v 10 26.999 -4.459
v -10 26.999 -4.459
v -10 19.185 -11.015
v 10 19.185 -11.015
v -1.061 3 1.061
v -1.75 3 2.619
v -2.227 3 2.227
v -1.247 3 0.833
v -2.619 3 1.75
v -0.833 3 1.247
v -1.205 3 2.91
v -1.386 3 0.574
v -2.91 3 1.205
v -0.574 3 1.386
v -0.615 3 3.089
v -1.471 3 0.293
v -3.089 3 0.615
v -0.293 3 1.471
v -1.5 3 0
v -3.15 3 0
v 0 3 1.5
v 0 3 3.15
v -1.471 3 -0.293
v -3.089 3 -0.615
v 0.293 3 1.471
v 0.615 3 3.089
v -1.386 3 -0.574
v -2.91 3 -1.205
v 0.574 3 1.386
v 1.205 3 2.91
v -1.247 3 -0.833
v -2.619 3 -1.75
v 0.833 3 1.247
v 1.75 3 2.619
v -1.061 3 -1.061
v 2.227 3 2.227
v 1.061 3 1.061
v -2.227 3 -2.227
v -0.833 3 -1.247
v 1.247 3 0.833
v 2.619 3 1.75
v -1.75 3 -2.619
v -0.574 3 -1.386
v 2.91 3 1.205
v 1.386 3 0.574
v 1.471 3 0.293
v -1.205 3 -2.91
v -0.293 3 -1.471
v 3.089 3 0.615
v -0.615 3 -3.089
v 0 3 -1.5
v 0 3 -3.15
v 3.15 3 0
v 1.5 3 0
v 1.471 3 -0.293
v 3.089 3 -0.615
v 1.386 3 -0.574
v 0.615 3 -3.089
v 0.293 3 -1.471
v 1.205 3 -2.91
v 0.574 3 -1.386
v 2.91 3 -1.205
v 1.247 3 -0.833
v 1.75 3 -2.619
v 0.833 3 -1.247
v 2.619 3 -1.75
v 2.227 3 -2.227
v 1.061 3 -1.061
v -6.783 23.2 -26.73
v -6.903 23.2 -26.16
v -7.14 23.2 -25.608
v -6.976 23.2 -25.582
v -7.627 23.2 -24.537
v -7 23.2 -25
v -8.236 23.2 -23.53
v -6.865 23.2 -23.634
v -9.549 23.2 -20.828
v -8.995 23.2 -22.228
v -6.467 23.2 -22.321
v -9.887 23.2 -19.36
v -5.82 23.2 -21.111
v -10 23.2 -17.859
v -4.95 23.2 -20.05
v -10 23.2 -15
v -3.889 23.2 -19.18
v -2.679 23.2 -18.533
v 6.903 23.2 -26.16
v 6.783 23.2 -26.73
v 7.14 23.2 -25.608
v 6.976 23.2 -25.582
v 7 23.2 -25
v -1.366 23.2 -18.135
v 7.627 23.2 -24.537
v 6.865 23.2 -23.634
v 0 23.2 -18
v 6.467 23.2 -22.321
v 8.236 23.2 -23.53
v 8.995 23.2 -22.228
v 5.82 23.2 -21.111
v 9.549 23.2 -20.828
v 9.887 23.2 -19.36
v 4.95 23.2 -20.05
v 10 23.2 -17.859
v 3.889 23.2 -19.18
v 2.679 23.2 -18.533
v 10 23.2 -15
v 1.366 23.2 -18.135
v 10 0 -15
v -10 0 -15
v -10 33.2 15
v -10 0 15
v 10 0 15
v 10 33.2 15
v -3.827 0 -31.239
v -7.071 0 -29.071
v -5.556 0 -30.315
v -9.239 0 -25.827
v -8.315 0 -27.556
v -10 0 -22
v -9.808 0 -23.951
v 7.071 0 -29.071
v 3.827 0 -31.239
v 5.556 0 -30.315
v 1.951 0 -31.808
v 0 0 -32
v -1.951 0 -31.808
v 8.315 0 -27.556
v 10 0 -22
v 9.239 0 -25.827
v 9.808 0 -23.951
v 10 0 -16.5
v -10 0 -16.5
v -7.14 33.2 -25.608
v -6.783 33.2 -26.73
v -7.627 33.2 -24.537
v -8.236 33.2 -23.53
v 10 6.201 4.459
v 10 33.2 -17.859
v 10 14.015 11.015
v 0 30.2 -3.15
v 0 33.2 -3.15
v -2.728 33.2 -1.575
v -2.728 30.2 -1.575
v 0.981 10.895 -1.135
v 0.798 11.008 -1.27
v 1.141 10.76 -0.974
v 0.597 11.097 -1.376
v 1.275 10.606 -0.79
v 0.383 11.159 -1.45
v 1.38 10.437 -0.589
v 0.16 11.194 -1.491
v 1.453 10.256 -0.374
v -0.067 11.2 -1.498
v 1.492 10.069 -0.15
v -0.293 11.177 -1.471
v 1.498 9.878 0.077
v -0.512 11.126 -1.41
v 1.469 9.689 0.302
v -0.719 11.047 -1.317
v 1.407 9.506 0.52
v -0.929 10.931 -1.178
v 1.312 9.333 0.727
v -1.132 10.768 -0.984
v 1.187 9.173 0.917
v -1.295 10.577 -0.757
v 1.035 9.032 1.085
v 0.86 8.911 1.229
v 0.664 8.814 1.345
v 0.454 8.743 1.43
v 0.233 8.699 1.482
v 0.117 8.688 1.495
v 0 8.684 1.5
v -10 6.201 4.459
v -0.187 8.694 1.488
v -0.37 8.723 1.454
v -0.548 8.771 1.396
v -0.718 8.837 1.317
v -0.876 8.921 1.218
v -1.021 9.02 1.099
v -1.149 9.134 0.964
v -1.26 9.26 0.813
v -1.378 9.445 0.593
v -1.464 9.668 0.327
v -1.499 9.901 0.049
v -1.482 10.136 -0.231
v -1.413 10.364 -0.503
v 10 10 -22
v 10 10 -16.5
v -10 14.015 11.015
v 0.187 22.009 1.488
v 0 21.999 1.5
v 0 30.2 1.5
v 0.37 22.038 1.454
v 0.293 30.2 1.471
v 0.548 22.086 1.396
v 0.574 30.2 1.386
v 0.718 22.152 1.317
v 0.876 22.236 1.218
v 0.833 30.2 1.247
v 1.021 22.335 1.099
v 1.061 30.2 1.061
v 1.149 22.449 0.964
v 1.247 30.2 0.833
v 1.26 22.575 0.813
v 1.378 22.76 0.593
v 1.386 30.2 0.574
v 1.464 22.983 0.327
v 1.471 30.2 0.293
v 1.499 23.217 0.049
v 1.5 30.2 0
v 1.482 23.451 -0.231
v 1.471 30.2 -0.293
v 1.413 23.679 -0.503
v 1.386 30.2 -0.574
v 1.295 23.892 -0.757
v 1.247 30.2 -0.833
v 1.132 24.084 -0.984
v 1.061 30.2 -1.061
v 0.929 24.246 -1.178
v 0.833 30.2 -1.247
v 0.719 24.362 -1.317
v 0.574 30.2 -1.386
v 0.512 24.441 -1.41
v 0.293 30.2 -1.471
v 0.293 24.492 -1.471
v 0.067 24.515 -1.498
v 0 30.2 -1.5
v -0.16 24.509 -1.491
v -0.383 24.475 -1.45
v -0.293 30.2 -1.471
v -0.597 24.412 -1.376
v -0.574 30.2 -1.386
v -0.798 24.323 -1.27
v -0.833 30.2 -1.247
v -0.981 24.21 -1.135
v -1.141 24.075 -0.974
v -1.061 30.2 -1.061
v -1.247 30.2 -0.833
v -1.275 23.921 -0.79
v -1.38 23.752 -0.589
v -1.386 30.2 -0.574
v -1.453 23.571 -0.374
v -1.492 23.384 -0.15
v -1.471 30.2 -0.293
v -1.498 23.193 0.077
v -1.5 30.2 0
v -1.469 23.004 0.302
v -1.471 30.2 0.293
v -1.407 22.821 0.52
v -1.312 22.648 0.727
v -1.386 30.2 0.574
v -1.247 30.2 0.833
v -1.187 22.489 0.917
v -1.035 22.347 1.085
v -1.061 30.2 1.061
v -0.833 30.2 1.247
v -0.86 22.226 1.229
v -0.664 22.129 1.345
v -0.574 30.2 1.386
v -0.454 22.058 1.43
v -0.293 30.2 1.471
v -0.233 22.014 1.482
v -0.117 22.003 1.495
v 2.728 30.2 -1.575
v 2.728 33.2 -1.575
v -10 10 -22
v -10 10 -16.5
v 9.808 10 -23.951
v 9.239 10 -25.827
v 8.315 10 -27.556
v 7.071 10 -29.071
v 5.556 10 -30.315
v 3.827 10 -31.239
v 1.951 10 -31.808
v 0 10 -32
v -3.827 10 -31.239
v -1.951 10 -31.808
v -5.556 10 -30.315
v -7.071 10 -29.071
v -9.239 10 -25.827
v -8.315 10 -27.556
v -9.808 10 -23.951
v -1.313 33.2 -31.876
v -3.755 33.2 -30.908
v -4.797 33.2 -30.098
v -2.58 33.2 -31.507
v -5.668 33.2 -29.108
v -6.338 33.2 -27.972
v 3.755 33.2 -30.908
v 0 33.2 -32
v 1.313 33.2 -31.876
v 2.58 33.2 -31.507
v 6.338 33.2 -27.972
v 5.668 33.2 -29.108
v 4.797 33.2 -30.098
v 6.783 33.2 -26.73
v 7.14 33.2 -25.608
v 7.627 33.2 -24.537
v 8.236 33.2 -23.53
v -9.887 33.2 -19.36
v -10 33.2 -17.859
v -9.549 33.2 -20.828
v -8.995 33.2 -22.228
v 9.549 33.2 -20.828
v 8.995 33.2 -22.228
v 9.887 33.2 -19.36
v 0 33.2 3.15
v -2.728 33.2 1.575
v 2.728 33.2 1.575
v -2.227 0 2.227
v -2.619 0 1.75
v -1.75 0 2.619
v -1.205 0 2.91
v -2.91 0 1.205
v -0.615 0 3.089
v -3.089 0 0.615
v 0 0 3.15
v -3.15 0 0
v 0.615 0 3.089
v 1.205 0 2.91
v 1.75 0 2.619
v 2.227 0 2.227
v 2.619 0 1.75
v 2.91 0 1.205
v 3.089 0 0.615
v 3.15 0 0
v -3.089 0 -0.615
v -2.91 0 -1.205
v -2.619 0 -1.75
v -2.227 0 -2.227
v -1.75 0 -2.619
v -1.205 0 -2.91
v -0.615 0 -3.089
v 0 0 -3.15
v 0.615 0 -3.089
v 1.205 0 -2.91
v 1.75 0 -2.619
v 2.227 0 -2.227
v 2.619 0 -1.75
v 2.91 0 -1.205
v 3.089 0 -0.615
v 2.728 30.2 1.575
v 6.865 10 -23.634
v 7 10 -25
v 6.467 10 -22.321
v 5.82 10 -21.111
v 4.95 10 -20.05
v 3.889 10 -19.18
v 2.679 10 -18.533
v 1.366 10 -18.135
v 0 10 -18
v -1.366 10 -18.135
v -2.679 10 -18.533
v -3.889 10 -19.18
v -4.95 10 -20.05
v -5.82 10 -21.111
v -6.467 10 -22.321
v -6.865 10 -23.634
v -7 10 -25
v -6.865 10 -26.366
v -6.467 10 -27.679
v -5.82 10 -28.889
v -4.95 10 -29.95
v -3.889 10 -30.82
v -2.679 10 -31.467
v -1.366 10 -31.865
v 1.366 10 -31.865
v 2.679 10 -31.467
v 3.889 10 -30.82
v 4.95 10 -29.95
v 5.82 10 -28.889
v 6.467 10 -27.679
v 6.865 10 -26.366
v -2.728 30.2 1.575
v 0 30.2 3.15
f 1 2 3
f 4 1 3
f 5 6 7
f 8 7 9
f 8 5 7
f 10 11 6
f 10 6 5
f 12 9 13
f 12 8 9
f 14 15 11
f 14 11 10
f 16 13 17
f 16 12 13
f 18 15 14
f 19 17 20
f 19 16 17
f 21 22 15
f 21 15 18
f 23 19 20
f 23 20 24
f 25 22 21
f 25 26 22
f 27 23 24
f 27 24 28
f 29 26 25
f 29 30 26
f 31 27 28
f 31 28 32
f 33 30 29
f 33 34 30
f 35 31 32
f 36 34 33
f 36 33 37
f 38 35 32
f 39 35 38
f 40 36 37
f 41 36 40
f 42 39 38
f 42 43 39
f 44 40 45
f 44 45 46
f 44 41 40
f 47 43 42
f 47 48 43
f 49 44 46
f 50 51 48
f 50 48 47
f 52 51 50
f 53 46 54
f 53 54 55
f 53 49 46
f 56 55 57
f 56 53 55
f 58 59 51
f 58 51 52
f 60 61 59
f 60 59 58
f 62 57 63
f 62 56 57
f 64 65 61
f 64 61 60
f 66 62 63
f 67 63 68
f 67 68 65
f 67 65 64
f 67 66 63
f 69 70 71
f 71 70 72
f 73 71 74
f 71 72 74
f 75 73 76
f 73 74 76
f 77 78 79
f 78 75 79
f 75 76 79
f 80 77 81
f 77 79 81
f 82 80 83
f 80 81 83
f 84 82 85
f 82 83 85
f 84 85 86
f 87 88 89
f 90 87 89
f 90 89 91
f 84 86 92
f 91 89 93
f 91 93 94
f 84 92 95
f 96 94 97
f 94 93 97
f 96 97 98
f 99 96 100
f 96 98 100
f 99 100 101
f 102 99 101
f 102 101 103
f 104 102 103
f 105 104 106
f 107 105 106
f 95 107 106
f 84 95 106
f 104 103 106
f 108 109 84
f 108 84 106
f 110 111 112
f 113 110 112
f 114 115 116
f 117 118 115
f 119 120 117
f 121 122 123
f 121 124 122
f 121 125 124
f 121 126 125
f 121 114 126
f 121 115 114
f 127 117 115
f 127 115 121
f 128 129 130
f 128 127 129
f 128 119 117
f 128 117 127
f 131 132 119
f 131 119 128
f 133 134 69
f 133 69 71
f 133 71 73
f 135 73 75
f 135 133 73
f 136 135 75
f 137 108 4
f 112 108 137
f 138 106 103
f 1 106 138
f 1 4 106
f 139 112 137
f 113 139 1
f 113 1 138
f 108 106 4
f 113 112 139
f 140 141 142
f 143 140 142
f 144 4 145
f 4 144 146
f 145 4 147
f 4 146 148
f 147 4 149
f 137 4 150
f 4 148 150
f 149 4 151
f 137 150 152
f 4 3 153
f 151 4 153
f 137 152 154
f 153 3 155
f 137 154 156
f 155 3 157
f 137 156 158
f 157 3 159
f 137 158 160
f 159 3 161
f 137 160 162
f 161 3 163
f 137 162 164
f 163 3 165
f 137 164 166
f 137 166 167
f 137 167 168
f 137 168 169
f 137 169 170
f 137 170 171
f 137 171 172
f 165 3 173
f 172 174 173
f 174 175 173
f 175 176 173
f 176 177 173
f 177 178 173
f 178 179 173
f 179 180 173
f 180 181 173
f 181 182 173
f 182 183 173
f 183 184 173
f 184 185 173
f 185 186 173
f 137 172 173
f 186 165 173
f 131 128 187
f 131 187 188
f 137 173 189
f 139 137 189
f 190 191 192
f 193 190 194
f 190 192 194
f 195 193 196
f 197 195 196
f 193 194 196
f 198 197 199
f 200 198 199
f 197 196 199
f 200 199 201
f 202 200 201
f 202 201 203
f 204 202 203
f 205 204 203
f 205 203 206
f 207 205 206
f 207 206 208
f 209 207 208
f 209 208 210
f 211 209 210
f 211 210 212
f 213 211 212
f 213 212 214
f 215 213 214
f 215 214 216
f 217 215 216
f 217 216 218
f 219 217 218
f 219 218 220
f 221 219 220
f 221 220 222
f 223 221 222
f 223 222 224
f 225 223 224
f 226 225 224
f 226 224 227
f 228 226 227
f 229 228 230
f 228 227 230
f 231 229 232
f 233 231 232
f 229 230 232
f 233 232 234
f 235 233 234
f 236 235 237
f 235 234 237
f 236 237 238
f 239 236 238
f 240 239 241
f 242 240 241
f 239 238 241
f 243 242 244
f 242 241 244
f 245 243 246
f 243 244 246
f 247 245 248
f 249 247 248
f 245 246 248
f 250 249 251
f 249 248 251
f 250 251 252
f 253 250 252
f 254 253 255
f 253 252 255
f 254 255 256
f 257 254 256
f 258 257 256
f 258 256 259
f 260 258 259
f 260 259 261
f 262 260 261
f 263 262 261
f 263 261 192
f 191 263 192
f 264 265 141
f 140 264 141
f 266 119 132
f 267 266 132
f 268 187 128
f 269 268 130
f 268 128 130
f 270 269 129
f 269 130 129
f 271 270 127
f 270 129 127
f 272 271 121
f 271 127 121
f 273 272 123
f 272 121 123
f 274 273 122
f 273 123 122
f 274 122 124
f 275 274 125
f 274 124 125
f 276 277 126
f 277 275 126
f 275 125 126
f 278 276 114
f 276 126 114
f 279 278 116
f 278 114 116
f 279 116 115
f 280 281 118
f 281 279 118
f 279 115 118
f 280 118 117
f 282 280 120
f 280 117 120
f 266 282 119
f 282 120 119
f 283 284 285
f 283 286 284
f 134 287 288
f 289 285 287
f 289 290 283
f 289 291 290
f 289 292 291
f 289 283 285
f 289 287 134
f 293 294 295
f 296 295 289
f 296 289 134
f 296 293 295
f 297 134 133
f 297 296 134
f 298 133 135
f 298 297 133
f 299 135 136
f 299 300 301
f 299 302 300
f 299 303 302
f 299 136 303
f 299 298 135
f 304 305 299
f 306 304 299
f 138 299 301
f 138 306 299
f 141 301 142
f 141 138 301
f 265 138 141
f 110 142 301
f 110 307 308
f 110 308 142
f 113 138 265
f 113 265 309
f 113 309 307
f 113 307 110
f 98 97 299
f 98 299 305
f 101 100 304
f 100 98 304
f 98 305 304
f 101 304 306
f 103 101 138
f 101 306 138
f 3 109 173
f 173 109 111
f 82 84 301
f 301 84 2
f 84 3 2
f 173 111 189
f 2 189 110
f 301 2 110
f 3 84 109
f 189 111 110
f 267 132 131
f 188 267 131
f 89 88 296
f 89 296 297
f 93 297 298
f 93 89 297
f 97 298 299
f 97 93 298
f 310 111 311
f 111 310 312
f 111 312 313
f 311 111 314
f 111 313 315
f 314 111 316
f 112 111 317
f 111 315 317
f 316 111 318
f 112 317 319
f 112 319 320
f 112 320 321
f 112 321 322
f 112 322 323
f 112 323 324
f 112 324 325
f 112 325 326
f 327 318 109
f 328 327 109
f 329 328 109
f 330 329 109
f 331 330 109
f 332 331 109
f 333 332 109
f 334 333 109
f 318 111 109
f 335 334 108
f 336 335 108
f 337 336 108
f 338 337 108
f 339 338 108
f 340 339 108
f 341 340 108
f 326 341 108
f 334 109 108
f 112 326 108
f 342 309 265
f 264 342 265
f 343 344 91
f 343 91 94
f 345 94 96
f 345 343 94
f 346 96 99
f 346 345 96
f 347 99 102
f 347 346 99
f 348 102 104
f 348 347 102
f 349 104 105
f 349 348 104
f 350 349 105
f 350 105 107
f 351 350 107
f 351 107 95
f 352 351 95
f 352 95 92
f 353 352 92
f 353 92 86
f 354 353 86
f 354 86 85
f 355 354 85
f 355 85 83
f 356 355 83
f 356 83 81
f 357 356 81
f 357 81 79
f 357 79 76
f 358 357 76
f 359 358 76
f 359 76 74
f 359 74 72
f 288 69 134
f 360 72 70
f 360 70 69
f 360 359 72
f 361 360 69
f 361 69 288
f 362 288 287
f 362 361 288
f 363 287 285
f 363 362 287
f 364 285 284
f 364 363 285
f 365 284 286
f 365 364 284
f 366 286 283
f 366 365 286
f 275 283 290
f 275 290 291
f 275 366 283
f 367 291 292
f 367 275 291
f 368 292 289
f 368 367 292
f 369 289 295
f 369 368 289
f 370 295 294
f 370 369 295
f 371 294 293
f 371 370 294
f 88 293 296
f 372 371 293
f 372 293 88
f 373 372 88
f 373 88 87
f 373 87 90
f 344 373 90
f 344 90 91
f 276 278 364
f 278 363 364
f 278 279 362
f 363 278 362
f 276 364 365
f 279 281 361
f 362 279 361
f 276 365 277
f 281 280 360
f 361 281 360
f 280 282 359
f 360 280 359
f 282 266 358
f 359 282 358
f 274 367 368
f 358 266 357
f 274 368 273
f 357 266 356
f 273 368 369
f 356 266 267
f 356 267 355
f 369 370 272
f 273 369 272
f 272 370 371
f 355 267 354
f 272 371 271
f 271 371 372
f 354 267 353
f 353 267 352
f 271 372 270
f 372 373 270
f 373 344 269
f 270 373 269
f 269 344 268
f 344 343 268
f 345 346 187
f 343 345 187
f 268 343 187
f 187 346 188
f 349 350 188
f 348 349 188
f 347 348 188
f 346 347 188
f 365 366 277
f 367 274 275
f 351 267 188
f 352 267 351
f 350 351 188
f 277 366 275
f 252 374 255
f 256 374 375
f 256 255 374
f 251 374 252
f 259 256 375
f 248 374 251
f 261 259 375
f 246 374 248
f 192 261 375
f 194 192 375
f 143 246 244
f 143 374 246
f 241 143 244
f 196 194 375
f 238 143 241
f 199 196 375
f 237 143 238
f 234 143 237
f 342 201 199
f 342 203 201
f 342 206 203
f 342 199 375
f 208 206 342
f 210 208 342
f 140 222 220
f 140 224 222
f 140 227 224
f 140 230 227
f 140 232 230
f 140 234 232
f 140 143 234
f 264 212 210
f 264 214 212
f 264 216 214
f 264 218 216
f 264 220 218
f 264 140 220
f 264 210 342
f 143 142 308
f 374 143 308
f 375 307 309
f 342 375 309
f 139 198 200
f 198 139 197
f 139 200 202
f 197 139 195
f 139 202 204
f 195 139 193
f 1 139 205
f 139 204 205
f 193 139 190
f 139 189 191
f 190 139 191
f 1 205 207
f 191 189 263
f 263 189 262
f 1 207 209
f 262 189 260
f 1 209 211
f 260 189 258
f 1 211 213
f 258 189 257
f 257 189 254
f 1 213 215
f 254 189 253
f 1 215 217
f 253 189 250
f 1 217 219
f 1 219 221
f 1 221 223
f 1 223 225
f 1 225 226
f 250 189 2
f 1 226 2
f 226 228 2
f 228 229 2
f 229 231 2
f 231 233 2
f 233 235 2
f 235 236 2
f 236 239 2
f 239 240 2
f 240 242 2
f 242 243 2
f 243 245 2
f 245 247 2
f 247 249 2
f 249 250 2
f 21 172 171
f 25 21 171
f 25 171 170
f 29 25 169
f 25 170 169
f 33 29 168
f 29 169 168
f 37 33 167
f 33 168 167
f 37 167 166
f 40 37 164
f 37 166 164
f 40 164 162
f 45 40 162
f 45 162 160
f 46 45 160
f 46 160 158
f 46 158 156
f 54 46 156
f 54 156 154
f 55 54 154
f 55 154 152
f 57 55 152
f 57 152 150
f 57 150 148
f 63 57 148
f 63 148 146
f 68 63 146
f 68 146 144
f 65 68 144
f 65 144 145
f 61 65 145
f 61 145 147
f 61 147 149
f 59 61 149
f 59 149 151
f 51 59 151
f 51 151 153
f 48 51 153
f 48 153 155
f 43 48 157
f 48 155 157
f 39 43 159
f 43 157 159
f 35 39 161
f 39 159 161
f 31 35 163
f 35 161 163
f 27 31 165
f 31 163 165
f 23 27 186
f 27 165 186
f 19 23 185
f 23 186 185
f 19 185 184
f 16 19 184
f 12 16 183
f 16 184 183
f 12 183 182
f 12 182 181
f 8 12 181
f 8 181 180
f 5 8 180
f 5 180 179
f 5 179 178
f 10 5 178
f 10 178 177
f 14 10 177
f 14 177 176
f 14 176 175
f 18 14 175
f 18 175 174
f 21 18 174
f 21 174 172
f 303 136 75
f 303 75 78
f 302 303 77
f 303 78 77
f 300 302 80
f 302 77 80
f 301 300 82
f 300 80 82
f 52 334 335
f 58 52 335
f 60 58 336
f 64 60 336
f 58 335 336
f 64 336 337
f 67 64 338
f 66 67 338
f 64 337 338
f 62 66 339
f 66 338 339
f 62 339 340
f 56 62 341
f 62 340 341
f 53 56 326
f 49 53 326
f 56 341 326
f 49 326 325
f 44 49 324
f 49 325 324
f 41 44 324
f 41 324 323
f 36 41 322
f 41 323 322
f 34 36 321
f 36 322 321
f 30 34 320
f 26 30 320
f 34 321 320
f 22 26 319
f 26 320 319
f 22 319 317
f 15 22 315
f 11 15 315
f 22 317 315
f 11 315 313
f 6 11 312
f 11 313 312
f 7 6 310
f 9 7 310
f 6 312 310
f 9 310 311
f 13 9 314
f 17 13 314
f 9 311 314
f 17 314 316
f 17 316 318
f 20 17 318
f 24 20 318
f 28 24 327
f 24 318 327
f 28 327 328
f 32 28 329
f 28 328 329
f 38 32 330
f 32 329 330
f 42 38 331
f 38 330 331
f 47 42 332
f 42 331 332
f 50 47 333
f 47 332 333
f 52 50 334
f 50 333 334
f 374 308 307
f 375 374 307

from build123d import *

# Parameters (mm, degrees)
SKETCH_1_W                      = 20
SKETCH_1_H                      = 30
EXTRUDE_1_DEPTH                 = 33.2
SKETCH_2_R                      = 1.5
CUT_EXTRUDE_1_DEPTH             = 38.778830051
CUT_EXTRUDE_4_DEPTH             = 30
SKETCH1_W                       = 20
SKETCH1_H                       = 10
BOSS_EXTRUDE2_DEPTH             = 10
BOSS_EXTRUDE3_REACH             = 37.542
SKETCH2_R                       = 7
BOSS_EXTRUDE3_DIRECTION_2_REACH = 37.542
FILLET1_R                       = 10
SKETCH3_W                       = 20
SKETCH3_H                       = 15.5
BOSS_EXTRUDE4_DEPTH             = 10
FILLET2_R                       = 10
SKETCH4_R                       = 3.15
CUT_EXTRUDE1_DEPTH              = 3
CUT_EXTRUDE2_DEPTH              = 3


with BuildPart() as part:
    # Эскиз1 → Бобышка-Вытянуть1 (new body)
    with BuildSketch(Plane(origin=(0, 0, 0), x_dir=(1, 0, 0), z_dir=(0, 1, 0))):
        Rectangle(SKETCH_1_W, SKETCH_1_H)
    extrude(amount=EXTRUDE_1_DEPTH)

    # Эскиз2 → Вырез-Вытянуть1 (cut, through all)
    with BuildSketch(Plane(origin=(0, 33.2, 0), x_dir=(1, 0, 0), z_dir=(0, 1, 0))):
        with Locations(Location((0, 0, 0), (0, 0, 270))):
            Circle(SKETCH_2_R)
    extrude(amount=-CUT_EXTRUDE_1_DEPTH, mode=Mode.SUBTRACT)

    # Эскиз5 → Вырез-Вытянуть4 (cut)
    with BuildSketch(Plane.ZY.offset(10)):
        Polygon((-4.458832066, 26.998981518), (-11.015265685, 19.185328198), (4.458832066, 6.201018482), (11.015265685, 14.014671802), align=None)
    extrude(amount=-CUT_EXTRUDE_4_DEPTH, mode=Mode.SUBTRACT)

    # Sketch1 → Boss-Extrude2 (add)
    with BuildSketch(Plane(origin=(0, 0, -15), x_dir=(-1, 0, 0), z_dir=(0, 0, -1))):
        with Locations((0, 28.2)):
            Rectangle(SKETCH1_W, SKETCH1_H)
    extrude(amount=BOSS_EXTRUDE2_DEPTH)

    # Boss-Extrude3: up to this face of the body (flat: up to its plane)
    boss_extrude3_end = Plane(part.part.faces().sort_by_distance((0, 0, 14.639444872))[0])
    # Sketch2 → Boss-Extrude3 (add, up to the picked face)
    with BuildSketch(Plane.XZ.offset(-23.2), mode=Mode.PRIVATE) as boss_extrude3_sk1:
        with Locations((0, -25)):
            Circle(SKETCH2_R)
    boss_extrude3_tool1 = split(extrude(boss_extrude3_sk1.sketch, amount=BOSS_EXTRUDE3_REACH, mode=Mode.PRIVATE), bisect_by=boss_extrude3_end, keep=Keep.BOTH, mode=Mode.PRIVATE)
    add(boss_extrude3_tool1.solids().sort_by(Axis((0, 23.2, -25), (0, -1, 0)))[0])

    # Boss-Extrude3 direction 2: up to this face of the body (flat: up to its plane)
    boss_extrude3_direction_2_end = Plane(part.part.faces().sort_by_distance((0, 33.2, -5.044572477))[0])
    # Sketch2 → Boss-Extrude3 direction 2 (add, up to the picked face)
    with BuildSketch(Plane.XZ.offset(-23.2), mode=Mode.PRIVATE) as boss_extrude3_direction_2_sk1:
        with Locations((0, -25)):
            Circle(SKETCH2_R)
    boss_extrude3_direction_2_tool1 = split(extrude(boss_extrude3_direction_2_sk1.sketch, amount=-BOSS_EXTRUDE3_DIRECTION_2_REACH, mode=Mode.PRIVATE), bisect_by=boss_extrude3_direction_2_end, keep=Keep.BOTH, mode=Mode.PRIVATE)
    add(boss_extrude3_direction_2_tool1.solids().sort_by(Axis((0, 23.2, -25), (0, 1, 0)))[0])

    # Fillet1
    # the kernel refuses this fillet: 10 mm, written as the material it takes off along each edge
    with BuildSketch(Plane(origin=(-10, 5.346428929, -25), x_dir=(0, 0, 1), z_dir=(0, 1, 0)), Plane(origin=(10, 51.053571071, -25), x_dir=(0, 0, 1), z_dir=(0, -1, 0))) as fillet1_piece_1:
        with BuildLine():
            CenterArc((7.141428429, 10), FILLET1_R, 224.427004001, 45.572995999)
            Line((0, 3), (-0.142828569, 2.86))
            ThreePointArc((-0.142828569, 2.86), (-0.2, 1.5), (-0.2, 0))
            Line((-0.2, 0), (0, -0.2))
            Line((0, -0.2), (7.141428429, -0.2))
            Line((7.141428429, -0.2), (7.141428429, 0))
        make_face()
    extrude(amount=45.707142143, mode=Mode.SUBTRACT)

    # Sketch3 → Boss-Extrude4 (add)
    with BuildSketch(Plane.XZ):
        with Locations((0, -24.25)):
            Rectangle(SKETCH3_W, SKETCH3_H)
    extrude(amount=-BOSS_EXTRUDE4_DEPTH)

    # Fillet2
    # the kernel refuses this fillet: 10 mm, written as the material it adds along each edge
    with BuildSketch(Plane(origin=(7, 23.2, -25), x_dir=(0.6436039974439222, 0, 0.7653586704769234), z_dir=(0, 1, 0))) as fillet2_piece_1:
        with BuildLine():
            CenterArc((2.881578556, 9.953762577), FILLET2_R, 244.245370549, 20.242721963)
            ThreePointArc((-1.463601761, 0.947131242), (-0.702200702, 0.519306771), (0, 0))
            ThreePointArc((0, 0), (0.960526185, 0.046237423), (1.921052371, 0))
        make_face()
    extrude(amount=10)
    with BuildSketch(Plane(origin=(-7, 33.2, -25), x_dir=(0.12452332997196464, 0, -0.9922166801121081), z_dir=(0, -1, 0))) as fillet2_piece_2:
        with BuildLine():
            CenterArc((2.988559919, -9.922166801), FILLET2_R, 97.153229531, 20.242721963)
            ThreePointArc((-1.612810589, -1.043687796), (-0.781284983, -0.560662311), (0, 0))
            ThreePointArc((0, 0), (0.87166331, -0.054483239), (1.74332662, 0))
        make_face()
    extrude(amount=10)
    # the kernel refuses this fillet: 10 mm, written as the material it takes off along each edge
    with BuildSketch(Plane(origin=(10, -25, -32), x_dir=(0, 0, 1), z_dir=(0, 1, 0)), Plane(origin=(-10, -25, -32), x_dir=(1, 0, 0), z_dir=(0, 1, 0))) as fillet2_2_piece_1:
        with BuildLine():
            CenterArc((FILLET2_R, -FILLET2_R), FILLET2_R, 90, 90)
            Line((0, -FILLET2_R), (0, 0))
            Line((0, 0), (FILLET2_R, 0))
        make_face()
    extrude(amount=60, mode=Mode.SUBTRACT)

    # Sketch4 → Cut-Extrude1 (cut)
    with BuildSketch(Plane.XZ):
        with Locations(Location((0, 0, 0), (0, 0, 270))):
            Circle(SKETCH4_R)
    extrude(amount=-CUT_EXTRUDE1_DEPTH, mode=Mode.SUBTRACT)

    # Sketch5 → Cut-Extrude2 (cut)
    with BuildSketch(Plane(origin=(0, 33.2, 0), x_dir=(1, 0, 0), z_dir=(0, 1, 0))):
        Polygon((0, 3.15), (-2.727980022, 1.575), (-2.727980022, -1.575), (0, -3.15), (2.727980022, -1.575), (2.727980022, 1.575), align=None)
    extrude(amount=-CUT_EXTRUDE2_DEPTH, mode=Mode.SUBTRACT)


solid = part.part
